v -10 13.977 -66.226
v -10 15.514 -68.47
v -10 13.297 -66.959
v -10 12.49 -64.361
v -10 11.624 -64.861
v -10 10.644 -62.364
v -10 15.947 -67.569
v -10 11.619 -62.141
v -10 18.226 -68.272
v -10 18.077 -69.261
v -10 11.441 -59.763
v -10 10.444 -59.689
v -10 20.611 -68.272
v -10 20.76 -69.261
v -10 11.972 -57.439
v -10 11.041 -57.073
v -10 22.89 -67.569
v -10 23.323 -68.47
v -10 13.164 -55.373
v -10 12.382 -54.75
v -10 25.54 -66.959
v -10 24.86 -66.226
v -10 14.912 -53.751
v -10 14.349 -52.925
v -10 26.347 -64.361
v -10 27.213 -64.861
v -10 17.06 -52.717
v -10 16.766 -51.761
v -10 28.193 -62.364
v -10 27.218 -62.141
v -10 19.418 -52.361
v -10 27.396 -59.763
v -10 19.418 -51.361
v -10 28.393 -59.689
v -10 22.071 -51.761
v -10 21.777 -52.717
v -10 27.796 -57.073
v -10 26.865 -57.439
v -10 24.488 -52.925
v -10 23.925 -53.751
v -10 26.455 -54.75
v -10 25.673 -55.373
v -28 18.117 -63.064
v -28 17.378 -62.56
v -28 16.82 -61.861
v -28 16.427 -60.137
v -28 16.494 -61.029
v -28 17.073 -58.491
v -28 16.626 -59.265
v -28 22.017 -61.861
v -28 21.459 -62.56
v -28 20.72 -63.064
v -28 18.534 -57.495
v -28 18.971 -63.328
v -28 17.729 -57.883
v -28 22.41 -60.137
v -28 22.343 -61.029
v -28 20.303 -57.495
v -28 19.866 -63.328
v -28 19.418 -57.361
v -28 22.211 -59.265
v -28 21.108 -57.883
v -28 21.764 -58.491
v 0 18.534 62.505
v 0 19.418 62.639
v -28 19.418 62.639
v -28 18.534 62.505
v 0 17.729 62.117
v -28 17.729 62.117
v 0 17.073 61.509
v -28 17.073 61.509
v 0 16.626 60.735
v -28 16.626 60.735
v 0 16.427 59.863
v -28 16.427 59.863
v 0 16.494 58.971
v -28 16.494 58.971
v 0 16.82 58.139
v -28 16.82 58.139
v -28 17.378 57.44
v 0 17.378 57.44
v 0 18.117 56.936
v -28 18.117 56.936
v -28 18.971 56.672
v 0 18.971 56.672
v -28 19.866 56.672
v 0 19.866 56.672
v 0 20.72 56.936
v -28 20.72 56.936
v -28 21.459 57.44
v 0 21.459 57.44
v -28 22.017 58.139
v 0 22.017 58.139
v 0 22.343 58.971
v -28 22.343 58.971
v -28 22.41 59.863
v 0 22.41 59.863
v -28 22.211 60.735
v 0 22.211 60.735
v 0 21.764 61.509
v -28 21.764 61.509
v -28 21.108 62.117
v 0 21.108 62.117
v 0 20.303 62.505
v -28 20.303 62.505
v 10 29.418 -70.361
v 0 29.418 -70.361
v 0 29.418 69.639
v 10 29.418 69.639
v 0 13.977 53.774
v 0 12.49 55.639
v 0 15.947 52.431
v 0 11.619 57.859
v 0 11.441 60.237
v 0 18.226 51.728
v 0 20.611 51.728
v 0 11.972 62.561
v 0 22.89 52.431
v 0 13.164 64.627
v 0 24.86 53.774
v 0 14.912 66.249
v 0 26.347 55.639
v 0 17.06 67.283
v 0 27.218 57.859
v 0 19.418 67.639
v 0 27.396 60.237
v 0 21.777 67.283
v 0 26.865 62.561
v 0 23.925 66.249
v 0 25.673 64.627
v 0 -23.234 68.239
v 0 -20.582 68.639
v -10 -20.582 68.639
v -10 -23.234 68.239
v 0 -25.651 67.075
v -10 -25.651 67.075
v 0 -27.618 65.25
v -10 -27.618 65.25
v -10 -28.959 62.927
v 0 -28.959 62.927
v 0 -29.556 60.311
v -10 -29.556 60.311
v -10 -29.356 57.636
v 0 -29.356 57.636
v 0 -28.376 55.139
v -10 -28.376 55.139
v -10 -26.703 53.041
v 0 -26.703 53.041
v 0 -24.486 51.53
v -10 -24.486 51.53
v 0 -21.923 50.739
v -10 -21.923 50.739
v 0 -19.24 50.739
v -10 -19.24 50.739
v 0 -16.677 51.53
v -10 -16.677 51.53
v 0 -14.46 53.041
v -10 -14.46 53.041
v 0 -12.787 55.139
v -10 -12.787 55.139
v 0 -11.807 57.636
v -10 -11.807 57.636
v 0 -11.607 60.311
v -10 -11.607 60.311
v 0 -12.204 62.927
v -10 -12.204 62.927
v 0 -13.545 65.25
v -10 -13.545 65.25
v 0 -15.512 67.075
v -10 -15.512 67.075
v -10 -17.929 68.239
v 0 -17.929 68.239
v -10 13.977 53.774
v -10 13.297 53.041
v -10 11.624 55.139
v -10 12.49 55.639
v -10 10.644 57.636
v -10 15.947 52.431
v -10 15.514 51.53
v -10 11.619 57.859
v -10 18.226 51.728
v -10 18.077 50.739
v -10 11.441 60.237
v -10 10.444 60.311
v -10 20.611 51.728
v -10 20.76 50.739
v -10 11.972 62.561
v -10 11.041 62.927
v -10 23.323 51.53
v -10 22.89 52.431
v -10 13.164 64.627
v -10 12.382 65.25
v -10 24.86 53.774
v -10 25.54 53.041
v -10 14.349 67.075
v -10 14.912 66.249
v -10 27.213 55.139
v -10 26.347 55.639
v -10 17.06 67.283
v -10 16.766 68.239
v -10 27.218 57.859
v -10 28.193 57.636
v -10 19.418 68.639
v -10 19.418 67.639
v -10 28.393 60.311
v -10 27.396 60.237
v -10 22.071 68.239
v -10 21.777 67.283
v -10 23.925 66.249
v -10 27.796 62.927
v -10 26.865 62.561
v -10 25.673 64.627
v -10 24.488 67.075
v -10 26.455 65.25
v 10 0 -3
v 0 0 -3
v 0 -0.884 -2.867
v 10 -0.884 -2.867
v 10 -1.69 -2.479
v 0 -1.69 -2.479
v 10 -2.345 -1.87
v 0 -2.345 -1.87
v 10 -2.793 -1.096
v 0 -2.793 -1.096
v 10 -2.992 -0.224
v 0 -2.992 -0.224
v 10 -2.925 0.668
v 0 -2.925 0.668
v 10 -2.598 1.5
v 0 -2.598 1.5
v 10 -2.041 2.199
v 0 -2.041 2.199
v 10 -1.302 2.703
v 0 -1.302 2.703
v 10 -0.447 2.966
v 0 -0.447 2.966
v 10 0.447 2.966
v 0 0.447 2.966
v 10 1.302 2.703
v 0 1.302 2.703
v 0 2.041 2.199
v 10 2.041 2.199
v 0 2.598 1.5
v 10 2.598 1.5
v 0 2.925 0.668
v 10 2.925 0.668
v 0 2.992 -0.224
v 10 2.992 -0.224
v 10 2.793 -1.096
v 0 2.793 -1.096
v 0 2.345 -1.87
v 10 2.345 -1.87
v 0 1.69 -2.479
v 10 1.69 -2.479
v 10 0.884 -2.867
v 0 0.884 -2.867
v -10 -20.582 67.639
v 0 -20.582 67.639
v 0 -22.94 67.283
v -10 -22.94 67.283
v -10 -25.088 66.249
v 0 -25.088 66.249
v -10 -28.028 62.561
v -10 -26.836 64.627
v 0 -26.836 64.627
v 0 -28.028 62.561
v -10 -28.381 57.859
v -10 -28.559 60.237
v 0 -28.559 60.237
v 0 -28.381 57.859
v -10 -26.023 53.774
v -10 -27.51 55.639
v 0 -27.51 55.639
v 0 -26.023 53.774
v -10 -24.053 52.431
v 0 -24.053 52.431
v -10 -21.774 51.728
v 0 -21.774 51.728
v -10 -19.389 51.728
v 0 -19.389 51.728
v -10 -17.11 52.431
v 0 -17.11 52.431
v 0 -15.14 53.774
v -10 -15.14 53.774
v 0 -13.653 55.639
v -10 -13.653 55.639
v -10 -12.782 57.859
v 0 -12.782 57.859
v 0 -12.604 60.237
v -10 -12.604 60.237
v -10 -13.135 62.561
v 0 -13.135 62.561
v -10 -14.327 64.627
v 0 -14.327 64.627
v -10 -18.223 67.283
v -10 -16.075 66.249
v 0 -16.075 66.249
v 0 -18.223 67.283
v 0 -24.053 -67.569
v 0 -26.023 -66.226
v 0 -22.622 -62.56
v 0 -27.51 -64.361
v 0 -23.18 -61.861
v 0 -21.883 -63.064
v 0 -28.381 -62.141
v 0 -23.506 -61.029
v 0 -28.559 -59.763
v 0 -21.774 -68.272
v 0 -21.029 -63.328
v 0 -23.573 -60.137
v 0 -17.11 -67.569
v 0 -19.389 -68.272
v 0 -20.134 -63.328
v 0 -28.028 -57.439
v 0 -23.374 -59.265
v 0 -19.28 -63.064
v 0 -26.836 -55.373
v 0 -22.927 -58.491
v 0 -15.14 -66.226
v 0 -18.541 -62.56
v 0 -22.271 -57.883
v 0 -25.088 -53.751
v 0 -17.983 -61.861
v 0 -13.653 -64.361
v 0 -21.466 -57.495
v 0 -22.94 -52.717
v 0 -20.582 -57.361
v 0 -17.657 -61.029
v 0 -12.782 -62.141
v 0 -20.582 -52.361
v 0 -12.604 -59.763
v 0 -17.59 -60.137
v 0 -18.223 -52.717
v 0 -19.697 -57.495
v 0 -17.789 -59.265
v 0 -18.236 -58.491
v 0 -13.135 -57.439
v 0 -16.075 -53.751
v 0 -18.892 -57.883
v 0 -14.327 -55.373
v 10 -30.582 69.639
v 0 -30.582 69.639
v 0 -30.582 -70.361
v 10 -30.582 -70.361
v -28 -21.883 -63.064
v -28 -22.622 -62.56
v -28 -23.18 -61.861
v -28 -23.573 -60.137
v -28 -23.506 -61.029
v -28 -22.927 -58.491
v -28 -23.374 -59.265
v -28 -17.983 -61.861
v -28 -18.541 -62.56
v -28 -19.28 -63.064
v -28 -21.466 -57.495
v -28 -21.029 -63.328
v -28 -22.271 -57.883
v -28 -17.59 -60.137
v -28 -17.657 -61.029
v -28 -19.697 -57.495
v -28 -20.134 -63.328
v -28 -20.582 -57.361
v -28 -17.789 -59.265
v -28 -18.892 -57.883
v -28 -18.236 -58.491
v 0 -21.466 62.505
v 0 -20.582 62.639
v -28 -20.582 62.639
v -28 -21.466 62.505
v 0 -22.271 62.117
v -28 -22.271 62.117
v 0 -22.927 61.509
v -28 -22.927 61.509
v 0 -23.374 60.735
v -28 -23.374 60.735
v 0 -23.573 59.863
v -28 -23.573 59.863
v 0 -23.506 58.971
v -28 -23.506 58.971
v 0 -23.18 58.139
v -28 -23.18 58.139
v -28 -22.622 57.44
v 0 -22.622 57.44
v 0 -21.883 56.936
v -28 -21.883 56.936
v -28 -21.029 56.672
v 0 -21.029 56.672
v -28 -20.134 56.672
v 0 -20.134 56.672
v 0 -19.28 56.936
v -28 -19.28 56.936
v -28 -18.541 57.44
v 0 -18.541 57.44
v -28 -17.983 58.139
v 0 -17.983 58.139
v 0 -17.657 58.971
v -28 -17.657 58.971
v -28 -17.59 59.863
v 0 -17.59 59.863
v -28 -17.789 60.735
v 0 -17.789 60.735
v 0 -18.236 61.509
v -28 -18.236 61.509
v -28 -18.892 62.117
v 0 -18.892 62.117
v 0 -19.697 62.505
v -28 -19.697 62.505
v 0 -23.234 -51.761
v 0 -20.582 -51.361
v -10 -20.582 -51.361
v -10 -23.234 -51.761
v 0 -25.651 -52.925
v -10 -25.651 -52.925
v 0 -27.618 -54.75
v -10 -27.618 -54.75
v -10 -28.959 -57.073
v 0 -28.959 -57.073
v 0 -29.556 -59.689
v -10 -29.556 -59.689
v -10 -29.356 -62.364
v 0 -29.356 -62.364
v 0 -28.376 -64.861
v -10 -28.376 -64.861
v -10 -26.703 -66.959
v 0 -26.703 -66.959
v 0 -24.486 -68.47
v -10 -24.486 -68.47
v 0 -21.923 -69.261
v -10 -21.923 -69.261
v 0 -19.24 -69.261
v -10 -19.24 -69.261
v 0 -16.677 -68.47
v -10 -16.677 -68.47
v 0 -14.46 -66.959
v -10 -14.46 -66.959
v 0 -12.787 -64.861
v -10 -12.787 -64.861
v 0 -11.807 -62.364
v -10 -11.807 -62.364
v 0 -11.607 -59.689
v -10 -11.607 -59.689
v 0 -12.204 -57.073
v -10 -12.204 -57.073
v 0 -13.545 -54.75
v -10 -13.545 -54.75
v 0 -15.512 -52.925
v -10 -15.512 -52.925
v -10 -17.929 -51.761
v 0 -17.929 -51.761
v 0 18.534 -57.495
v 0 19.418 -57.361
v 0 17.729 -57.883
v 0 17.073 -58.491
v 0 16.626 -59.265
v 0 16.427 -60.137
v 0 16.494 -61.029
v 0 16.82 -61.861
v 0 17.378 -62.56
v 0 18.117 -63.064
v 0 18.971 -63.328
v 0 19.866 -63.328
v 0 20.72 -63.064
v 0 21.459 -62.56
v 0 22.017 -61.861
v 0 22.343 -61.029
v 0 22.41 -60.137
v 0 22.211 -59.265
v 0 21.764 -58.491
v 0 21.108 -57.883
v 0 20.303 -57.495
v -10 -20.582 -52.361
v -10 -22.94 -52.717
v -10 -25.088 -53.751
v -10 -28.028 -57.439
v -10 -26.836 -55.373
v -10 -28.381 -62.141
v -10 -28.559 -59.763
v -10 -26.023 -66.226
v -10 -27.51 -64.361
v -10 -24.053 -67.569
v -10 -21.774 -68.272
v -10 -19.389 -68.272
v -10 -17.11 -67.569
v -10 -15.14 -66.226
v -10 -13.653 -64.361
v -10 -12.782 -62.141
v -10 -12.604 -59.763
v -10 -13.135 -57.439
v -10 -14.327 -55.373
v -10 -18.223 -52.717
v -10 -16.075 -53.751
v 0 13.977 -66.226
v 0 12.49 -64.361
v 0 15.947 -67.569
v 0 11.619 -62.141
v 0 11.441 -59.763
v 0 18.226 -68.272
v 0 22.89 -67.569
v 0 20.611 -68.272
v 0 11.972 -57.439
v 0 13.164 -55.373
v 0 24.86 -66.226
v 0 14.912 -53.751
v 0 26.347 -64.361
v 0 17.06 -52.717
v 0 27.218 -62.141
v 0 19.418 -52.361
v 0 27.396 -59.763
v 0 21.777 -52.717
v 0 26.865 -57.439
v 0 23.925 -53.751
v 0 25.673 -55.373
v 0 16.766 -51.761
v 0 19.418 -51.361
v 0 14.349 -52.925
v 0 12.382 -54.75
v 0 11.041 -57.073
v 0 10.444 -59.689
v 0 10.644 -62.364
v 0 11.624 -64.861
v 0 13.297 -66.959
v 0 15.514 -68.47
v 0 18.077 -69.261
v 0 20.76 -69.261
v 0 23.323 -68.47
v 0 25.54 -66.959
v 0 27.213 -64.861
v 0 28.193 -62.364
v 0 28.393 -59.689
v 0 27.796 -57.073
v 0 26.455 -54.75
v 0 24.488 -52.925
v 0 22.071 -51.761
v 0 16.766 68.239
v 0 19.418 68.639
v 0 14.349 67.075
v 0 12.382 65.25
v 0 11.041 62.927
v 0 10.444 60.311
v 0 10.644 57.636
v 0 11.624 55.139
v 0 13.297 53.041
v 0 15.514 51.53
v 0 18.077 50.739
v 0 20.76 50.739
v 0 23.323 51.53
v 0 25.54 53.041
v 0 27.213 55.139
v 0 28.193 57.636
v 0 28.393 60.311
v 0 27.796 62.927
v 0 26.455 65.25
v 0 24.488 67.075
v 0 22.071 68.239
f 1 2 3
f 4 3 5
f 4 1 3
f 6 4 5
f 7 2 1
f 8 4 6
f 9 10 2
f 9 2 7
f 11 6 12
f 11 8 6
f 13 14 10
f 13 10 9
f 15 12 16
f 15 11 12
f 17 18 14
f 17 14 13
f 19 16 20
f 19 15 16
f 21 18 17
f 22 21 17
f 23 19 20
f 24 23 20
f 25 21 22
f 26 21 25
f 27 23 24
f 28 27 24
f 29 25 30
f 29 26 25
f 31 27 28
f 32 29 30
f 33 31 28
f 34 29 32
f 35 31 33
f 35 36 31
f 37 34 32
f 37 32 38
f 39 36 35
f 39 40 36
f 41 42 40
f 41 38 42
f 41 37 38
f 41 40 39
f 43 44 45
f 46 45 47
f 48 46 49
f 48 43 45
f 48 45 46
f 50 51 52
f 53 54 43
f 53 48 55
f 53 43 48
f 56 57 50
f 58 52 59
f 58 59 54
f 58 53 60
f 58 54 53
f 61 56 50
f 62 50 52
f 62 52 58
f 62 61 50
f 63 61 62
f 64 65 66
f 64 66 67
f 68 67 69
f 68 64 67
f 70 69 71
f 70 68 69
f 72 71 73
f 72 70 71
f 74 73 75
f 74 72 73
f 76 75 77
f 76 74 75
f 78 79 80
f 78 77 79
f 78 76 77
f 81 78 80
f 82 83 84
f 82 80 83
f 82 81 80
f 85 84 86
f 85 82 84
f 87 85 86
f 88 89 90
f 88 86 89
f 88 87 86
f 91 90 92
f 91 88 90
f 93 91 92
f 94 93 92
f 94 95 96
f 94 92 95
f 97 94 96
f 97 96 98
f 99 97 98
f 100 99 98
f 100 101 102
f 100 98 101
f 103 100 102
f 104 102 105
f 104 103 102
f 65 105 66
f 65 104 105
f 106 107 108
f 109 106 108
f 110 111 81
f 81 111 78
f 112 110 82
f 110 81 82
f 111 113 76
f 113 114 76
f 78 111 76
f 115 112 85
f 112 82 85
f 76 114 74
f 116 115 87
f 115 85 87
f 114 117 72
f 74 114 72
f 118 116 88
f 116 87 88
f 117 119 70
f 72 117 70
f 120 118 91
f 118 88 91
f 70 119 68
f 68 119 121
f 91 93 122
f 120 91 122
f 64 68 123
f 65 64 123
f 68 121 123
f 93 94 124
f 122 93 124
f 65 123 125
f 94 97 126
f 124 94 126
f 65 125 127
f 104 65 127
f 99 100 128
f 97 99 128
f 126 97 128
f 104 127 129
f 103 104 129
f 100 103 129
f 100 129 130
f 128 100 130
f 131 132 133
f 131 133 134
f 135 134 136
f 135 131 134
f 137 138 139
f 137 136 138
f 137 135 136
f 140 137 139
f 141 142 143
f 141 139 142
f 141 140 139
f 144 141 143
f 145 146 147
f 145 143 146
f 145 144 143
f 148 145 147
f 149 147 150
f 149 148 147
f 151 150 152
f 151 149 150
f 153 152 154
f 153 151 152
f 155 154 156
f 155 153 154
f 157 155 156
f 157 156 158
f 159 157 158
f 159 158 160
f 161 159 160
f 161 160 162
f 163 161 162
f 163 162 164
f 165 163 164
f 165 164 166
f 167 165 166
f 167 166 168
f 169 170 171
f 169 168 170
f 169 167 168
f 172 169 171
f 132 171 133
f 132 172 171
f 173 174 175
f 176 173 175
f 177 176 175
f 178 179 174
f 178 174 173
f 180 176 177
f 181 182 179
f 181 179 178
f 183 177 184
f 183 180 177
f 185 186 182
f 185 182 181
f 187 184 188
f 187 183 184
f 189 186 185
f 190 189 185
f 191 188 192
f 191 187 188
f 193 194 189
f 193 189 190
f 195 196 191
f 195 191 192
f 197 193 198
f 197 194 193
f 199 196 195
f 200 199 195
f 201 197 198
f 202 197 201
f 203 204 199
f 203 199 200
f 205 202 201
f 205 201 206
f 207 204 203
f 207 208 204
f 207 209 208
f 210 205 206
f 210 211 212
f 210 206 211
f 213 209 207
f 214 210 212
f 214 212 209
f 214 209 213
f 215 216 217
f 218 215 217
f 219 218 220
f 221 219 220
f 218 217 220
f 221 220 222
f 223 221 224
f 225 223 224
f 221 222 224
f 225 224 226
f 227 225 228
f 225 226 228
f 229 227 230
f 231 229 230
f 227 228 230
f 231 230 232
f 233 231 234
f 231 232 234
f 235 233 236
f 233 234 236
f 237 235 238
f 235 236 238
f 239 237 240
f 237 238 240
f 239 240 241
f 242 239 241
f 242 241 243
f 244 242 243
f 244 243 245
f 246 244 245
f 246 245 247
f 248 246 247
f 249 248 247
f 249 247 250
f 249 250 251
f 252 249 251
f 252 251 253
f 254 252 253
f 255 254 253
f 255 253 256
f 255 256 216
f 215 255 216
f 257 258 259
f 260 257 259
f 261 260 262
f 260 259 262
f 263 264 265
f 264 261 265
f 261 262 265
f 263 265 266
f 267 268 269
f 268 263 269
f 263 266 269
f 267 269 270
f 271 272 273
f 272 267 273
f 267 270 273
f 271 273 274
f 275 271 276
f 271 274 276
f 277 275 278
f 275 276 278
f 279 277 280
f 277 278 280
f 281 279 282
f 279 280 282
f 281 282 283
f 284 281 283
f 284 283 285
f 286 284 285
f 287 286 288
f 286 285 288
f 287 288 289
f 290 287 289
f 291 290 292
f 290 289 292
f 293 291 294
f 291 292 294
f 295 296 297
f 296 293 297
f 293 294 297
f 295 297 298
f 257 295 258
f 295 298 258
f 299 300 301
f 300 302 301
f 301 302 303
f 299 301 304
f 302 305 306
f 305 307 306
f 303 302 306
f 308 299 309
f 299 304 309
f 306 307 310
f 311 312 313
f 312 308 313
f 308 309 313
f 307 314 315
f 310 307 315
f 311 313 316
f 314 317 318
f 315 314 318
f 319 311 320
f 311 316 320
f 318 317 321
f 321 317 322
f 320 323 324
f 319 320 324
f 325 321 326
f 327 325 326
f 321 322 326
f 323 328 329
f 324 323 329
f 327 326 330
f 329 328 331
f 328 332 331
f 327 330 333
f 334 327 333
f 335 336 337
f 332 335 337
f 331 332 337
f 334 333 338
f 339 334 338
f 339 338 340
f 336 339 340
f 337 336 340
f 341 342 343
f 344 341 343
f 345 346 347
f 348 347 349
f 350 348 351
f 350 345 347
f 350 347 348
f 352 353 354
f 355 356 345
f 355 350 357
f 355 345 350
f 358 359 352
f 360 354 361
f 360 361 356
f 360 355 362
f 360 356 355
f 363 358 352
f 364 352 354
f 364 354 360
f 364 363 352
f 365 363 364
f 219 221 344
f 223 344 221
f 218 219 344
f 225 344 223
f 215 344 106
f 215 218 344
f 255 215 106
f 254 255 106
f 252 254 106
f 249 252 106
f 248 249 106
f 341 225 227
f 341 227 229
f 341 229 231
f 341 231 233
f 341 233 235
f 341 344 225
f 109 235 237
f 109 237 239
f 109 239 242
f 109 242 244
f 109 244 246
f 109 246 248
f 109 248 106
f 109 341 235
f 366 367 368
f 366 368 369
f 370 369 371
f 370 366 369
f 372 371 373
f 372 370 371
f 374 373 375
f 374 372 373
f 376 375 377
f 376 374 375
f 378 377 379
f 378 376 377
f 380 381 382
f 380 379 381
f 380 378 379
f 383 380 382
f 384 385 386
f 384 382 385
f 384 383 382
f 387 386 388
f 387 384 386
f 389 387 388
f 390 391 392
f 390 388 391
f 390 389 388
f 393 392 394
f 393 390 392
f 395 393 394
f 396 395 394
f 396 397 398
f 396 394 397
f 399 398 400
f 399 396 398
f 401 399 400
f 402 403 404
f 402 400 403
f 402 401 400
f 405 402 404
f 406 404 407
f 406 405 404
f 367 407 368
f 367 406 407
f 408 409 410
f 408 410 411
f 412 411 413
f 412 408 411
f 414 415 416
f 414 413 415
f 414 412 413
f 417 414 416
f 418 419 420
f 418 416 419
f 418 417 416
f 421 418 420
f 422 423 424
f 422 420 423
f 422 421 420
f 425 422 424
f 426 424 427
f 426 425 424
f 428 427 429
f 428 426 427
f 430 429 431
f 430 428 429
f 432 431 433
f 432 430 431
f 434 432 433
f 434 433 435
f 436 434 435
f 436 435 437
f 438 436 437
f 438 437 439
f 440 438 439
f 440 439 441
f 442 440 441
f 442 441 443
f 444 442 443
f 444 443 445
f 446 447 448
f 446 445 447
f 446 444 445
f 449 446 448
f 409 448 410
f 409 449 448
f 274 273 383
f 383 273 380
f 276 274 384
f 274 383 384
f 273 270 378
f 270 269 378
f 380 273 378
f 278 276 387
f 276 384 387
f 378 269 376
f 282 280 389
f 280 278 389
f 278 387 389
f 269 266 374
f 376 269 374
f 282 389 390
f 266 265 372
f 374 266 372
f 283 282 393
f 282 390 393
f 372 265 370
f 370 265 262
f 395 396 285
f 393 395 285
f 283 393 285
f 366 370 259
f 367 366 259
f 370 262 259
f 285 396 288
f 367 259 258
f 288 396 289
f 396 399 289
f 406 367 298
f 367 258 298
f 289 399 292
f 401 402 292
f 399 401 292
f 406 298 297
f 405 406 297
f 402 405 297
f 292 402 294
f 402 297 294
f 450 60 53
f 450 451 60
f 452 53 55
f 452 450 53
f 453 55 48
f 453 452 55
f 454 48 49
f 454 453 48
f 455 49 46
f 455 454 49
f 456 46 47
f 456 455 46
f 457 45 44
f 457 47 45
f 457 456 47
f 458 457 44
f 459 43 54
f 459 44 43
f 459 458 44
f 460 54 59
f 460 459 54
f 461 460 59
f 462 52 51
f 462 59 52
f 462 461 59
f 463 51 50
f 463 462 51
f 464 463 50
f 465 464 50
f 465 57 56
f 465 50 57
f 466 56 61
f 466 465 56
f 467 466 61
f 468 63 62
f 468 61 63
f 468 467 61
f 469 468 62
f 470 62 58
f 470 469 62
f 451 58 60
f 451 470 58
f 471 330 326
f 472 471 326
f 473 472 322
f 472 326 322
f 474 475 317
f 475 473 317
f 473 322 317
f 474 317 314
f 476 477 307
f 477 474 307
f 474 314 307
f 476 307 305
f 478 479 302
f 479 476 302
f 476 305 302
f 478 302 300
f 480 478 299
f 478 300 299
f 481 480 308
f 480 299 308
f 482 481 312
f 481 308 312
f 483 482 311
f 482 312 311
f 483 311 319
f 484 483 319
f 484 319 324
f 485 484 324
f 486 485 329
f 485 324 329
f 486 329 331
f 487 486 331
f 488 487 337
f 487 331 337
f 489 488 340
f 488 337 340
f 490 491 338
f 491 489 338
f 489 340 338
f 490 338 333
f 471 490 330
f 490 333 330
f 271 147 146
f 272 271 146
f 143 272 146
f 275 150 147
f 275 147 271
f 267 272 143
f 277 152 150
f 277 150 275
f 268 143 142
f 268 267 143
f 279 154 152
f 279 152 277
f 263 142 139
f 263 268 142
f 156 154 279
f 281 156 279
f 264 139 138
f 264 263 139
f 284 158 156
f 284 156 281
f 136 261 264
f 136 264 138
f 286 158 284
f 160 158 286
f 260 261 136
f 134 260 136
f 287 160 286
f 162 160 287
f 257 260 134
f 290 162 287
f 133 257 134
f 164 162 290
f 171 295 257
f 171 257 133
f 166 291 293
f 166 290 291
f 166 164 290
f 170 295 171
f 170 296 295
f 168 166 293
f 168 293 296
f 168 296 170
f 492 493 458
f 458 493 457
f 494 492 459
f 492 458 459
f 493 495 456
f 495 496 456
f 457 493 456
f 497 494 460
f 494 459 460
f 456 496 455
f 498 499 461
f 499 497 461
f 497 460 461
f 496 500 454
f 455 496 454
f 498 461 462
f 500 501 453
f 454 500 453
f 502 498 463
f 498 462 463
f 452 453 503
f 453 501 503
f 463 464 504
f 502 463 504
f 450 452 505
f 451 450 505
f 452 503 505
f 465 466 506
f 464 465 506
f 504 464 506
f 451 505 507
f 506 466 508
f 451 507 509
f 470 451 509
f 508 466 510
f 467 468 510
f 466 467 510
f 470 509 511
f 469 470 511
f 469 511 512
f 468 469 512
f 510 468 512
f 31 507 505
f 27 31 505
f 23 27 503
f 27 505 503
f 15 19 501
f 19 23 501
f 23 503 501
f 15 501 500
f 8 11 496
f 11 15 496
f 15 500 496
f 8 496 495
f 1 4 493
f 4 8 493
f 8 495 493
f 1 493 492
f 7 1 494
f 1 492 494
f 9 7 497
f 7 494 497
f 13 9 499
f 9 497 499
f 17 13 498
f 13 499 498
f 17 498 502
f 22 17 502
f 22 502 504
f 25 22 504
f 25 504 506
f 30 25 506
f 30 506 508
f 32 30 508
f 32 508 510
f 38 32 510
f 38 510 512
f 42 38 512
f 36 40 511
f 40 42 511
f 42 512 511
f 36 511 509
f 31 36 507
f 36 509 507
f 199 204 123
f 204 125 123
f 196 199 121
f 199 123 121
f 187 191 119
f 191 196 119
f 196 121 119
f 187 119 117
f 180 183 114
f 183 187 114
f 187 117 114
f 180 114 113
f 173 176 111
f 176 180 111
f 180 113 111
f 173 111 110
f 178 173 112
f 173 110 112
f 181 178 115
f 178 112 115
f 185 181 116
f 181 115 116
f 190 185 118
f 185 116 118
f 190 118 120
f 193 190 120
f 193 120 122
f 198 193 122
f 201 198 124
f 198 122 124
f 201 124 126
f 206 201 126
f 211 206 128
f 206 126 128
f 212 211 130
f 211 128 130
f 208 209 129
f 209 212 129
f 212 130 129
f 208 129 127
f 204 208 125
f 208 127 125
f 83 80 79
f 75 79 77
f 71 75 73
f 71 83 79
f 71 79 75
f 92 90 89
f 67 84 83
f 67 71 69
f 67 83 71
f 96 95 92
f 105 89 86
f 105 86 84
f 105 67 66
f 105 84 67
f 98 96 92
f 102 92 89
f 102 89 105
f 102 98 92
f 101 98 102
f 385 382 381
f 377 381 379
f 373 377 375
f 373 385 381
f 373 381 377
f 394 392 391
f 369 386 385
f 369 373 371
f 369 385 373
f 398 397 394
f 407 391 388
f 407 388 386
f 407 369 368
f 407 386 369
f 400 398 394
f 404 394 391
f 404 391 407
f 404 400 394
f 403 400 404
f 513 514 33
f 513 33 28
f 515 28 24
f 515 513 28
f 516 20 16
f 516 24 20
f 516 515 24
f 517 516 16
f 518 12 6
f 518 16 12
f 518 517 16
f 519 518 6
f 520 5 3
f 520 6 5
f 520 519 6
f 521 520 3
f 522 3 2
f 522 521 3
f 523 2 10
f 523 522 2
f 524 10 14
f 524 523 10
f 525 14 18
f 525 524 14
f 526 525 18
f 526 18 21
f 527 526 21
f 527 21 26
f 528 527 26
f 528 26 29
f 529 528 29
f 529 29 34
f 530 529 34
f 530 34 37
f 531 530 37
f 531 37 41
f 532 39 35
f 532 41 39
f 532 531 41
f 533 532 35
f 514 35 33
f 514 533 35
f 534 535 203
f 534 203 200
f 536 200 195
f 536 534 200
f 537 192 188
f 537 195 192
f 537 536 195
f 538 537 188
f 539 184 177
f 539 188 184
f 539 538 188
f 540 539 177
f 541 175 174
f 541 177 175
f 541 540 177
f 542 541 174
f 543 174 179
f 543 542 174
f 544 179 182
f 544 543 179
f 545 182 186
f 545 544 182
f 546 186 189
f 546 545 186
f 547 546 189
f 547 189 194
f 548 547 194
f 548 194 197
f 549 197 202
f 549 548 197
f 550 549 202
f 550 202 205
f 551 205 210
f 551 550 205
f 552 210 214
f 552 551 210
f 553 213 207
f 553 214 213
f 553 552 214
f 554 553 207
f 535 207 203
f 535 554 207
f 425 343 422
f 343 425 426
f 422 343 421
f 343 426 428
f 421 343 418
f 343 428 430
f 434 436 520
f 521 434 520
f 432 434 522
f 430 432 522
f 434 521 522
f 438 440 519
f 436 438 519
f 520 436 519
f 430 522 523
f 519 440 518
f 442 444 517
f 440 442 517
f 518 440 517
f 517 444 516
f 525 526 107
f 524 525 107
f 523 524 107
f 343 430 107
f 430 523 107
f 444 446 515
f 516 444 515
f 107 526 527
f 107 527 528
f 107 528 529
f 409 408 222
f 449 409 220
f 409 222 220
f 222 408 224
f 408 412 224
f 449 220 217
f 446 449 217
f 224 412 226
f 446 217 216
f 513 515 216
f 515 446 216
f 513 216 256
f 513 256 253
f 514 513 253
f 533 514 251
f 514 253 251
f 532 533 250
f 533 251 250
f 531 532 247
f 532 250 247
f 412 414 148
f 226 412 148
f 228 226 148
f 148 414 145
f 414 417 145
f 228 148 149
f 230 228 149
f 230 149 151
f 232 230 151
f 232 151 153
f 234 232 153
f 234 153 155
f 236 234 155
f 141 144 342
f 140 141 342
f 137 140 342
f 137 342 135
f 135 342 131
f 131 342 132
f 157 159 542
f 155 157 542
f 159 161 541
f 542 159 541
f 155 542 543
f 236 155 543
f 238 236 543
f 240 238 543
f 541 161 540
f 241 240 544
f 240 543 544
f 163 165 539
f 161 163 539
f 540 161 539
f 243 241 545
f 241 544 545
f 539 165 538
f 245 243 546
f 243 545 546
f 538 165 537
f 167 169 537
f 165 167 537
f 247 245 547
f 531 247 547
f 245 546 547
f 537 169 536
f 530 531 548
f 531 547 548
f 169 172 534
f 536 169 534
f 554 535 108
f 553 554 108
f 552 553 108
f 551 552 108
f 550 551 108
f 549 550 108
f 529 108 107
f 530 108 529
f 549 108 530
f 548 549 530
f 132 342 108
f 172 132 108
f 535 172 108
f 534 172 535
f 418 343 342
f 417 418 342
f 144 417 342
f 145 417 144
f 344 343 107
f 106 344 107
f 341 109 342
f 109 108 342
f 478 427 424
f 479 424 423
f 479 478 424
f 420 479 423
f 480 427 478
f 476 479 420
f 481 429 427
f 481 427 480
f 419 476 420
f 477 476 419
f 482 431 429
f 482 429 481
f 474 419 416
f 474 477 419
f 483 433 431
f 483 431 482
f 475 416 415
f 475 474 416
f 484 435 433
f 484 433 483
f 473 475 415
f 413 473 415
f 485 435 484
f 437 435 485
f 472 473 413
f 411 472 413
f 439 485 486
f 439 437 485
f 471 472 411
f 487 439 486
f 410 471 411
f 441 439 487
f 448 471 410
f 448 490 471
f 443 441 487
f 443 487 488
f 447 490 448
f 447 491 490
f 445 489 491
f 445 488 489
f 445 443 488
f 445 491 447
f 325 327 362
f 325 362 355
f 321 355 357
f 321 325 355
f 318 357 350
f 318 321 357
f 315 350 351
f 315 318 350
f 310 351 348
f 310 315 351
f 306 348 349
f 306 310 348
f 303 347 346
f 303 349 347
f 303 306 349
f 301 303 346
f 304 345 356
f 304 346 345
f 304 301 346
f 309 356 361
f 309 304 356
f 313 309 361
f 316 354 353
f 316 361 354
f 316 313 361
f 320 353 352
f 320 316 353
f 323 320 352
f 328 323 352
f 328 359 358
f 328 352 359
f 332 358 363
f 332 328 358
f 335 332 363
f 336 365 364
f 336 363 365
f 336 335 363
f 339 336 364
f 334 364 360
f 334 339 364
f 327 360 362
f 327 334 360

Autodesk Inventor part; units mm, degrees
ref_plane "YZ Plane" through (0, 0, 0) normal (1, 0, 0) x (0, 1, 0)
ref_plane "XZ Plane" through (0, 0, 0) normal (0, 1, 0) x (-1, 0, 0)
ref_plane "XY Plane" through (0, 0, 0) normal (0, 0, 1) x (1, 0, 0)
sketch "スケッチ1" plane through (0, 0, 0) normal (1, 0, 0) x (0, 1, 0)
  point P0 (0, 0)
sketch "スケッチ2" plane through (0, 0, 0) normal (1, 0, 0) x (0, 1, 0)
  line L0 (29.4185, 69.6387) -> (-30.5815, 69.6387)
  line L1 (-30.5815, 69.6387) -> (-30.5815, -70.3613)
  line L2 (-30.5815, -70.3613) -> (29.4185, -70.3613)
  line L3 (29.4185, -70.3613) -> (29.4185, 69.6387)
  point P0 (0, 0)
  dimension "d0" = 60
  dimension "d1" = 140
extrude "押し出し1" add sketch "スケッチ2" along normal blind 10
sketch "スケッチ3" plane through (0, 0, 0) normal (-1, 0, 0) x (0, 0, 1)
  circle A0 centre (-60.3613, 19.4185) radius 9
  line L0 (-70.3613, 29.4185) -> (69.6387, 29.4185) projected
  line L1 (-70.3613, -30.5815) -> (-70.3613, 29.4185) projected
  circle A1 centre (-60.3613, -20.5815) radius 9
  line L2 (69.6387, -30.5815) -> (-70.3613, -30.5815) projected
  circle A2 centre (59.6387, -20.5815) radius 9
  line L3 (69.6387, 29.4185) -> (69.6387, -30.5815) projected
  circle A3 centre (59.6387, 19.4185) radius 9
  circle A4 centre (-60.3613, 19.4185) radius 8
  circle A5 centre (-60.3613, -20.5815) radius 8
  circle A6 centre (59.6387, 19.4185) radius 8
  circle A7 centre (59.6387, -20.5815) radius 8
  point P0 (0, 0)
  dimension "d4" = 18
  dimension "d5" = 10
  dimension "d6" = 10
  dimension "d7" = 18
  dimension "d8" = 10
  dimension "d9" = 18
  dimension "d10" = 10
  dimension "d11" = 18
  dimension "d12" = 16
  dimension "d13" = 16
  dimension "d14" = 16
  dimension "d15" = 16
extrude "押し出し2" add sketch "スケッチ3" along normal blind 10 contours A0 | A1 | A2 | A3
sketch "スケッチ4" plane through (0, 0, 0) normal (-1, 0, 0) x (0, 0, 1)
  point P0 (0, 0)
sketch "スケッチ5" plane through (0, 0, 0) normal (-1, 0, 0) x (0, 0, 1)
  circle A0 centre (-60.3613, 19.4185) radius 3
  line L0 (-70.3613, 29.4185) -> (69.6387, 29.4185) projected
  line L1 (-70.3613, -30.5815) -> (-70.3613, 29.4185) projected
  circle A1 centre (-60.3613, -20.5815) radius 3
  line L2 (69.6387, -30.5815) -> (-70.3613, -30.5815) projected
  circle A2 centre (59.6387, 19.4185) radius 3
  line L3 (69.6387, 29.4185) -> (69.6387, -30.5815) projected
  point P0 (0, 0)
  dimension "d18" = 6
  dimension "d19" = 10
  dimension "d20" = 10
  dimension "d21" = 6
  dimension "d22" = 10
  dimension "d23" = 6
  dimension "d24" = 10
sketch "スケッチ6" plane through (0, 0, 0) normal (-1, 0, 0) x (0, 0, 1)
  circle A0 centre (-60.3613, 19.4185) radius 3
  circle A1 centre (59.6387, 19.4185) radius 3
  circle A2 centre (59.6387, -20.5815) radius 3
  line L0 (69.6387, 29.4185) -> (69.6387, -30.5815) projected
  line L1 (69.6387, -30.5815) -> (-70.3613, -30.5815) projected
  point P0 (0, 0)
  dimension "d25" = 6
  dimension "d26" = 6
  dimension "d27" = 6
  dimension "d28" = 10
  dimension "d29" = 10
extrude "押し出し3" add sketch "スケッチ6" along normal blind 28
extrude "押し出し4" add sketch "スケッチ5" along normal blind 28 contours A1
sketch "スケッチ7" plane through (10, 0, 0) normal (1, 0, 0) x (0, 0, -1)
  point P0 (0, 0)
sketch "スケッチ8" plane through (10, 0, 0) normal (1, 0, 0) x (0, 0, -1)
  circle A0 centre (0, 0) radius 1
  dimension "d35" = 2
sketch "スケッチ9" plane through (10, 0, 0) normal (1, 0, 0) x (0, 0, -1)
  circle A0 centre (0, 0) radius 3
  dimension "d36" = 6
hole "穴1" at (10, 0, 0) direction (-1, 0, 0) diameter 6 depth 10
equation "\"BendRadius\" = Thickness"
equation "\"BendReliefWidth\" = Thickness"
equation "\"BendReliefDepth\" = 0.5 * Thickness"
equation "\"CornerReliefSize\" = 4 * Thickness"
equation "\"MinimumRemnant\" = 2 * Thickness"
equation "\"TransitionRadius\" = BendRadius"
equation "\"JacobiRadiusSize\" = BendRadius"
equation "\"GapSize\" = Thickness"
equation "\"Thickness\" = 0.5"
